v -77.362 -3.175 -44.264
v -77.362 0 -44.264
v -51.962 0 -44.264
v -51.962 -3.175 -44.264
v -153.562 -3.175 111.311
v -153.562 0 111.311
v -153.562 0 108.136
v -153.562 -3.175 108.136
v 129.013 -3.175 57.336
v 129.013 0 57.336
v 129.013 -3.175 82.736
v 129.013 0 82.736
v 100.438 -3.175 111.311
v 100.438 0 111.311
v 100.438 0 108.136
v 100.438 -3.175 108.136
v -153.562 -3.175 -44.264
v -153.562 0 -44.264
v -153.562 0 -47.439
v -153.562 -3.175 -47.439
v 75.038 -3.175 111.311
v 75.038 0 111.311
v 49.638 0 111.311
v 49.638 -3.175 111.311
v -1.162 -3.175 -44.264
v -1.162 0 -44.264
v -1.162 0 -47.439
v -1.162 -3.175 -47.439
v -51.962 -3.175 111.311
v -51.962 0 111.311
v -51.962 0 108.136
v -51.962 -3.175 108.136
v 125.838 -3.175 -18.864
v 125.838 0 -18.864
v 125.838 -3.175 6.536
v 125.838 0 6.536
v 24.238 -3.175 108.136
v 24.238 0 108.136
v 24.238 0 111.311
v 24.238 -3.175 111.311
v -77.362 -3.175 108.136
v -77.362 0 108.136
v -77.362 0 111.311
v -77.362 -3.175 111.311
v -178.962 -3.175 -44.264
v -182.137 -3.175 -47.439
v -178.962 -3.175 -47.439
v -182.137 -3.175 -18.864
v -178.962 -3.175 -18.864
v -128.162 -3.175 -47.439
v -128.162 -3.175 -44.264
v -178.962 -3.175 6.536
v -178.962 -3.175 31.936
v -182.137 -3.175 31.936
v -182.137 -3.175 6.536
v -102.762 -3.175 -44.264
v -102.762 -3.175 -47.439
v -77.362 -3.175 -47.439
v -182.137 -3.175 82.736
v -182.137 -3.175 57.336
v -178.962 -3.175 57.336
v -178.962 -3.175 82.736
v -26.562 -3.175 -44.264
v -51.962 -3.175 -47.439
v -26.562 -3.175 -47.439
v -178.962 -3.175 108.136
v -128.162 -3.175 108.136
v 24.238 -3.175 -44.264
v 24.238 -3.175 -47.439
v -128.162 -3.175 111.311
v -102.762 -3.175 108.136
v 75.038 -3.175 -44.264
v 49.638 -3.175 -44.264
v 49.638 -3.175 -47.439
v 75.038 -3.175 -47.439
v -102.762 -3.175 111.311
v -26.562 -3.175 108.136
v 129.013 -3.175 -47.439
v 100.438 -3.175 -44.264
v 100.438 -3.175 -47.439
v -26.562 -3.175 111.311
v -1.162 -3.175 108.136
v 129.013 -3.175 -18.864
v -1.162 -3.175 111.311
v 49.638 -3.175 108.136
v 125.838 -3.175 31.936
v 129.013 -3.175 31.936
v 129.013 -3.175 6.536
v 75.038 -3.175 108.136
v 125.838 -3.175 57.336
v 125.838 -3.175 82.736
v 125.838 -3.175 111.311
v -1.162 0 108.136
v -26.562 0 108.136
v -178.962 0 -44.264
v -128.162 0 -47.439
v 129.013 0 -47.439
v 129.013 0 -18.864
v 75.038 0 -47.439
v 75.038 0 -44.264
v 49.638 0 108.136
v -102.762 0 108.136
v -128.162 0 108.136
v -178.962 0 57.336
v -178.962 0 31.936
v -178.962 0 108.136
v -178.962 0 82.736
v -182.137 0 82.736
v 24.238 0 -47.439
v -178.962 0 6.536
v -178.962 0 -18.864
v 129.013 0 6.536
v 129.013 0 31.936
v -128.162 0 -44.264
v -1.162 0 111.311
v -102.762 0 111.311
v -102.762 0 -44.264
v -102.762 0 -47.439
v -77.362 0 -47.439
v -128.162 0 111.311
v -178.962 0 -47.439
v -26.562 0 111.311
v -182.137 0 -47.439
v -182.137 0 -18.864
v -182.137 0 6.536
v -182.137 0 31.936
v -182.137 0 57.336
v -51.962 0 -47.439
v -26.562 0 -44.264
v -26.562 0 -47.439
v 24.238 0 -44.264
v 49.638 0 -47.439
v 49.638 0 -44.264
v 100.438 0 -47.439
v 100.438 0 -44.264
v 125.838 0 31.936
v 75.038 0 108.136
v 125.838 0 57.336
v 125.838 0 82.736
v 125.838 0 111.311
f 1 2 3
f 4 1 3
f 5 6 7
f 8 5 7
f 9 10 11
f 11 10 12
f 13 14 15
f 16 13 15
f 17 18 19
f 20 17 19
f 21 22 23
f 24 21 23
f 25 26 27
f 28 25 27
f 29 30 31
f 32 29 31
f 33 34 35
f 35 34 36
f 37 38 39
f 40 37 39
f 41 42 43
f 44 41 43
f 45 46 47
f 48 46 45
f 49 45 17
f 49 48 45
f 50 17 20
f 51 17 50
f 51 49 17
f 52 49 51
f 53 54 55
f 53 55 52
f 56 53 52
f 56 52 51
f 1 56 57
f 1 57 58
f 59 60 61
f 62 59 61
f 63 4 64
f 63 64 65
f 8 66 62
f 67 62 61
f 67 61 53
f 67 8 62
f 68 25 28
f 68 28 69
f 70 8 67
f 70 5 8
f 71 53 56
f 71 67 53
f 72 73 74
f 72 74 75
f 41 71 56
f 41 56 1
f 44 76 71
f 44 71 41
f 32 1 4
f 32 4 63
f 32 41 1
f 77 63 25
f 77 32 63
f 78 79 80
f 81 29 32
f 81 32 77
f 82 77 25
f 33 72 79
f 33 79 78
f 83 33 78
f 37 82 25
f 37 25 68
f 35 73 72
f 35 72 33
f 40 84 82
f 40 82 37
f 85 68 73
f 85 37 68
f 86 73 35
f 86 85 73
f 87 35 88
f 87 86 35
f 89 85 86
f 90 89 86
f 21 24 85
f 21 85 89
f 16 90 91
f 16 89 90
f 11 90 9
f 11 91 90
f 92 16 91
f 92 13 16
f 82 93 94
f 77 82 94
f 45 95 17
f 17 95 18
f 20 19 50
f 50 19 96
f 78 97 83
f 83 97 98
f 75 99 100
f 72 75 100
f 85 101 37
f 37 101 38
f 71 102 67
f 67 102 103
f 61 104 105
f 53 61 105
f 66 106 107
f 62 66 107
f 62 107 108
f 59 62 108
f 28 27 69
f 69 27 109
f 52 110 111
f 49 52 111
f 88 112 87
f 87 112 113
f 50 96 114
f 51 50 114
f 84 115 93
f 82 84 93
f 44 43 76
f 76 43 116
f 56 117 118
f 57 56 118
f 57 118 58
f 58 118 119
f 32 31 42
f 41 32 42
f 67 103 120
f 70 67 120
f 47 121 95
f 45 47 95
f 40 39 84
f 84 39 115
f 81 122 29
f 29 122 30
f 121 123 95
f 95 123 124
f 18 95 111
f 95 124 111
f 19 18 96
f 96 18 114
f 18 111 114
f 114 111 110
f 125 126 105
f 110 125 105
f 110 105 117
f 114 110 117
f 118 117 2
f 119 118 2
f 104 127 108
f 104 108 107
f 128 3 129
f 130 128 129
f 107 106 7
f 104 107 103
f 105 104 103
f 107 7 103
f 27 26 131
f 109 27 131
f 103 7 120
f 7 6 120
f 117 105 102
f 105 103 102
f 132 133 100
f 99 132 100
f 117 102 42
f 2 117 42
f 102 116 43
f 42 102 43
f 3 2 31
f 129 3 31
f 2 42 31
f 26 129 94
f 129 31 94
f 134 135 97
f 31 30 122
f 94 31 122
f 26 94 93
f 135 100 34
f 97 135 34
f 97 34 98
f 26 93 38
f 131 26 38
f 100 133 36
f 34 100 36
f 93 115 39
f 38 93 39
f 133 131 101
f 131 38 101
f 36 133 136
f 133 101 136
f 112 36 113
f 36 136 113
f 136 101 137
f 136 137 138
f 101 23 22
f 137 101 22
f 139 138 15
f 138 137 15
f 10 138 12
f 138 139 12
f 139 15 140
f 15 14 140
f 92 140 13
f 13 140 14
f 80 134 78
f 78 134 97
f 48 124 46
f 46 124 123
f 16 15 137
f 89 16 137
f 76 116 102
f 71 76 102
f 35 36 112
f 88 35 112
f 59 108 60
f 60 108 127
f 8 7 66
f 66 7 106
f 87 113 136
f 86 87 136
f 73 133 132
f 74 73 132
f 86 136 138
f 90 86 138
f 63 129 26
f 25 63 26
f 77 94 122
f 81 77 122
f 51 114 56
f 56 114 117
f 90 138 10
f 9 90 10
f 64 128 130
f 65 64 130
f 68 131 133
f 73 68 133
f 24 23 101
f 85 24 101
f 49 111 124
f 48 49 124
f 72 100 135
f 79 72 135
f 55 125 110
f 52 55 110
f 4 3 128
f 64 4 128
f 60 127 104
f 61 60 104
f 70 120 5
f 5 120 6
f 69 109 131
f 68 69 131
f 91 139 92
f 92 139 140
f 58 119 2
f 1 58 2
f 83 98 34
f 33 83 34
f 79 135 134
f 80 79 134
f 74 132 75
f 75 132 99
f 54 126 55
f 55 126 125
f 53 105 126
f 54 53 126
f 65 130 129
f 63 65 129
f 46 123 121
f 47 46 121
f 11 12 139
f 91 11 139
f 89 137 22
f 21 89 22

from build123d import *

# Parameters (mm, degrees)
F1_DEPTH = 3.175


# Not quite as in the source:
# - a length typed as a fraction of an inch, garbled in the dataset ("3 / 203.2 mm" for 3/8 in), is restored


with BuildPart() as f1:
    # F0 (on Front) → F1 (new body)
    with BuildSketch(Plane.XZ):
        Polygon((-178.9622853069, -44.2643848114), (-153.5622853069, -44.2643848114), (-153.5622853069, -47.4393848114), (-128.1622853069, -47.4393848114), (-128.1622853069, -44.2643848114), (-102.7622853069, -44.2643848114), (-102.7622853069, -47.4393848114), (-77.3622853069, -47.4393848114), (-77.3622853069, -44.2643848114), (-51.9622853069, -44.2643848114), (-51.9622853069, -47.4393848114), (-26.5622853069, -47.4393848114), (-26.5622853069, -44.2643848114), (-26.5622853069, 108.1356151886), (-26.5622853069, 111.3106151886), (-51.9622853069, 111.3106151886), (-51.9622853069, 108.1356151886), (-77.3622853069, 108.1356151886), (-77.3622853069, 111.3106151886), (-102.7622853069, 111.3106151886), (-102.7622853069, 108.1356151886), (-128.1622853069, 108.1356151886), (-128.1622853069, 111.3106151886), (-153.5622853069, 111.3106151886), (-153.5622853069, 108.1356151886), (-178.9622853069, 108.1356151886), (-178.9622853069, 82.7356151886), (-182.1372853069, 82.7356151886), (-182.1372853069, 57.3356151886), (-178.9622853069, 57.3356151886), (-178.9622853069, 31.9356151886), (-182.1372853069, 31.9356151886), (-182.1372853069, 6.5356151886), (-178.9622853069, 6.5356151886), (-178.9622853069, -18.8643848114), (-182.1372853069, -18.8643848114), (-182.1372853069, -44.2643848114), (-182.1372853069, -47.4393848114), (-178.9622853069, -47.4393848114), align=None)
        Polygon((-26.5622853069, 108.1356151886), (-26.5622853069, -44.2643848114), (-1.1622853069, -44.2643848114), (-1.1622853069, -47.4393848114), (24.2377146931, -47.4393848114), (24.2377146931, -44.2643848114), (49.6377146931, -44.2643848114), (49.6377146931, -47.4393848114), (75.0377146931, -47.4393848114), (75.0377146931, -44.2643848114), (100.4377146931, -44.2643848114), (100.4377146931, -47.4393848114), (125.8377146931, -47.4393848114), (129.0127146931, -47.4393848114), (129.0127146931, -44.2643848114), (129.0127146931, -18.8643848114), (125.8377146931, -18.8643848114), (125.8377146931, 6.5356151886), (129.0127146931, 6.5356151886), (129.0127146931, 31.9356151886), (125.8377146931, 31.9356151886), (125.8377146931, 57.3356151886), (129.0127146931, 57.3356151886), (129.0127146931, 82.7356151886), (125.8377146931, 82.7356151886), (125.8377146931, 108.1356151886), (125.8377146931, 111.3106151886), (100.4377146931, 111.3106151886), (100.4377146931, 108.1356151886), (75.0377146931, 108.1356151886), (75.0377146931, 111.3106151886), (49.6377146931, 111.3106151886), (49.6377146931, 108.1356151886), (24.2377146931, 108.1356151886), (24.2377146931, 111.3106151886), (-1.1622853069, 111.3106151886), (-1.1622853069, 108.1356151886), align=None)
    extrude(amount=F1_DEPTH)


solid = f1.part
